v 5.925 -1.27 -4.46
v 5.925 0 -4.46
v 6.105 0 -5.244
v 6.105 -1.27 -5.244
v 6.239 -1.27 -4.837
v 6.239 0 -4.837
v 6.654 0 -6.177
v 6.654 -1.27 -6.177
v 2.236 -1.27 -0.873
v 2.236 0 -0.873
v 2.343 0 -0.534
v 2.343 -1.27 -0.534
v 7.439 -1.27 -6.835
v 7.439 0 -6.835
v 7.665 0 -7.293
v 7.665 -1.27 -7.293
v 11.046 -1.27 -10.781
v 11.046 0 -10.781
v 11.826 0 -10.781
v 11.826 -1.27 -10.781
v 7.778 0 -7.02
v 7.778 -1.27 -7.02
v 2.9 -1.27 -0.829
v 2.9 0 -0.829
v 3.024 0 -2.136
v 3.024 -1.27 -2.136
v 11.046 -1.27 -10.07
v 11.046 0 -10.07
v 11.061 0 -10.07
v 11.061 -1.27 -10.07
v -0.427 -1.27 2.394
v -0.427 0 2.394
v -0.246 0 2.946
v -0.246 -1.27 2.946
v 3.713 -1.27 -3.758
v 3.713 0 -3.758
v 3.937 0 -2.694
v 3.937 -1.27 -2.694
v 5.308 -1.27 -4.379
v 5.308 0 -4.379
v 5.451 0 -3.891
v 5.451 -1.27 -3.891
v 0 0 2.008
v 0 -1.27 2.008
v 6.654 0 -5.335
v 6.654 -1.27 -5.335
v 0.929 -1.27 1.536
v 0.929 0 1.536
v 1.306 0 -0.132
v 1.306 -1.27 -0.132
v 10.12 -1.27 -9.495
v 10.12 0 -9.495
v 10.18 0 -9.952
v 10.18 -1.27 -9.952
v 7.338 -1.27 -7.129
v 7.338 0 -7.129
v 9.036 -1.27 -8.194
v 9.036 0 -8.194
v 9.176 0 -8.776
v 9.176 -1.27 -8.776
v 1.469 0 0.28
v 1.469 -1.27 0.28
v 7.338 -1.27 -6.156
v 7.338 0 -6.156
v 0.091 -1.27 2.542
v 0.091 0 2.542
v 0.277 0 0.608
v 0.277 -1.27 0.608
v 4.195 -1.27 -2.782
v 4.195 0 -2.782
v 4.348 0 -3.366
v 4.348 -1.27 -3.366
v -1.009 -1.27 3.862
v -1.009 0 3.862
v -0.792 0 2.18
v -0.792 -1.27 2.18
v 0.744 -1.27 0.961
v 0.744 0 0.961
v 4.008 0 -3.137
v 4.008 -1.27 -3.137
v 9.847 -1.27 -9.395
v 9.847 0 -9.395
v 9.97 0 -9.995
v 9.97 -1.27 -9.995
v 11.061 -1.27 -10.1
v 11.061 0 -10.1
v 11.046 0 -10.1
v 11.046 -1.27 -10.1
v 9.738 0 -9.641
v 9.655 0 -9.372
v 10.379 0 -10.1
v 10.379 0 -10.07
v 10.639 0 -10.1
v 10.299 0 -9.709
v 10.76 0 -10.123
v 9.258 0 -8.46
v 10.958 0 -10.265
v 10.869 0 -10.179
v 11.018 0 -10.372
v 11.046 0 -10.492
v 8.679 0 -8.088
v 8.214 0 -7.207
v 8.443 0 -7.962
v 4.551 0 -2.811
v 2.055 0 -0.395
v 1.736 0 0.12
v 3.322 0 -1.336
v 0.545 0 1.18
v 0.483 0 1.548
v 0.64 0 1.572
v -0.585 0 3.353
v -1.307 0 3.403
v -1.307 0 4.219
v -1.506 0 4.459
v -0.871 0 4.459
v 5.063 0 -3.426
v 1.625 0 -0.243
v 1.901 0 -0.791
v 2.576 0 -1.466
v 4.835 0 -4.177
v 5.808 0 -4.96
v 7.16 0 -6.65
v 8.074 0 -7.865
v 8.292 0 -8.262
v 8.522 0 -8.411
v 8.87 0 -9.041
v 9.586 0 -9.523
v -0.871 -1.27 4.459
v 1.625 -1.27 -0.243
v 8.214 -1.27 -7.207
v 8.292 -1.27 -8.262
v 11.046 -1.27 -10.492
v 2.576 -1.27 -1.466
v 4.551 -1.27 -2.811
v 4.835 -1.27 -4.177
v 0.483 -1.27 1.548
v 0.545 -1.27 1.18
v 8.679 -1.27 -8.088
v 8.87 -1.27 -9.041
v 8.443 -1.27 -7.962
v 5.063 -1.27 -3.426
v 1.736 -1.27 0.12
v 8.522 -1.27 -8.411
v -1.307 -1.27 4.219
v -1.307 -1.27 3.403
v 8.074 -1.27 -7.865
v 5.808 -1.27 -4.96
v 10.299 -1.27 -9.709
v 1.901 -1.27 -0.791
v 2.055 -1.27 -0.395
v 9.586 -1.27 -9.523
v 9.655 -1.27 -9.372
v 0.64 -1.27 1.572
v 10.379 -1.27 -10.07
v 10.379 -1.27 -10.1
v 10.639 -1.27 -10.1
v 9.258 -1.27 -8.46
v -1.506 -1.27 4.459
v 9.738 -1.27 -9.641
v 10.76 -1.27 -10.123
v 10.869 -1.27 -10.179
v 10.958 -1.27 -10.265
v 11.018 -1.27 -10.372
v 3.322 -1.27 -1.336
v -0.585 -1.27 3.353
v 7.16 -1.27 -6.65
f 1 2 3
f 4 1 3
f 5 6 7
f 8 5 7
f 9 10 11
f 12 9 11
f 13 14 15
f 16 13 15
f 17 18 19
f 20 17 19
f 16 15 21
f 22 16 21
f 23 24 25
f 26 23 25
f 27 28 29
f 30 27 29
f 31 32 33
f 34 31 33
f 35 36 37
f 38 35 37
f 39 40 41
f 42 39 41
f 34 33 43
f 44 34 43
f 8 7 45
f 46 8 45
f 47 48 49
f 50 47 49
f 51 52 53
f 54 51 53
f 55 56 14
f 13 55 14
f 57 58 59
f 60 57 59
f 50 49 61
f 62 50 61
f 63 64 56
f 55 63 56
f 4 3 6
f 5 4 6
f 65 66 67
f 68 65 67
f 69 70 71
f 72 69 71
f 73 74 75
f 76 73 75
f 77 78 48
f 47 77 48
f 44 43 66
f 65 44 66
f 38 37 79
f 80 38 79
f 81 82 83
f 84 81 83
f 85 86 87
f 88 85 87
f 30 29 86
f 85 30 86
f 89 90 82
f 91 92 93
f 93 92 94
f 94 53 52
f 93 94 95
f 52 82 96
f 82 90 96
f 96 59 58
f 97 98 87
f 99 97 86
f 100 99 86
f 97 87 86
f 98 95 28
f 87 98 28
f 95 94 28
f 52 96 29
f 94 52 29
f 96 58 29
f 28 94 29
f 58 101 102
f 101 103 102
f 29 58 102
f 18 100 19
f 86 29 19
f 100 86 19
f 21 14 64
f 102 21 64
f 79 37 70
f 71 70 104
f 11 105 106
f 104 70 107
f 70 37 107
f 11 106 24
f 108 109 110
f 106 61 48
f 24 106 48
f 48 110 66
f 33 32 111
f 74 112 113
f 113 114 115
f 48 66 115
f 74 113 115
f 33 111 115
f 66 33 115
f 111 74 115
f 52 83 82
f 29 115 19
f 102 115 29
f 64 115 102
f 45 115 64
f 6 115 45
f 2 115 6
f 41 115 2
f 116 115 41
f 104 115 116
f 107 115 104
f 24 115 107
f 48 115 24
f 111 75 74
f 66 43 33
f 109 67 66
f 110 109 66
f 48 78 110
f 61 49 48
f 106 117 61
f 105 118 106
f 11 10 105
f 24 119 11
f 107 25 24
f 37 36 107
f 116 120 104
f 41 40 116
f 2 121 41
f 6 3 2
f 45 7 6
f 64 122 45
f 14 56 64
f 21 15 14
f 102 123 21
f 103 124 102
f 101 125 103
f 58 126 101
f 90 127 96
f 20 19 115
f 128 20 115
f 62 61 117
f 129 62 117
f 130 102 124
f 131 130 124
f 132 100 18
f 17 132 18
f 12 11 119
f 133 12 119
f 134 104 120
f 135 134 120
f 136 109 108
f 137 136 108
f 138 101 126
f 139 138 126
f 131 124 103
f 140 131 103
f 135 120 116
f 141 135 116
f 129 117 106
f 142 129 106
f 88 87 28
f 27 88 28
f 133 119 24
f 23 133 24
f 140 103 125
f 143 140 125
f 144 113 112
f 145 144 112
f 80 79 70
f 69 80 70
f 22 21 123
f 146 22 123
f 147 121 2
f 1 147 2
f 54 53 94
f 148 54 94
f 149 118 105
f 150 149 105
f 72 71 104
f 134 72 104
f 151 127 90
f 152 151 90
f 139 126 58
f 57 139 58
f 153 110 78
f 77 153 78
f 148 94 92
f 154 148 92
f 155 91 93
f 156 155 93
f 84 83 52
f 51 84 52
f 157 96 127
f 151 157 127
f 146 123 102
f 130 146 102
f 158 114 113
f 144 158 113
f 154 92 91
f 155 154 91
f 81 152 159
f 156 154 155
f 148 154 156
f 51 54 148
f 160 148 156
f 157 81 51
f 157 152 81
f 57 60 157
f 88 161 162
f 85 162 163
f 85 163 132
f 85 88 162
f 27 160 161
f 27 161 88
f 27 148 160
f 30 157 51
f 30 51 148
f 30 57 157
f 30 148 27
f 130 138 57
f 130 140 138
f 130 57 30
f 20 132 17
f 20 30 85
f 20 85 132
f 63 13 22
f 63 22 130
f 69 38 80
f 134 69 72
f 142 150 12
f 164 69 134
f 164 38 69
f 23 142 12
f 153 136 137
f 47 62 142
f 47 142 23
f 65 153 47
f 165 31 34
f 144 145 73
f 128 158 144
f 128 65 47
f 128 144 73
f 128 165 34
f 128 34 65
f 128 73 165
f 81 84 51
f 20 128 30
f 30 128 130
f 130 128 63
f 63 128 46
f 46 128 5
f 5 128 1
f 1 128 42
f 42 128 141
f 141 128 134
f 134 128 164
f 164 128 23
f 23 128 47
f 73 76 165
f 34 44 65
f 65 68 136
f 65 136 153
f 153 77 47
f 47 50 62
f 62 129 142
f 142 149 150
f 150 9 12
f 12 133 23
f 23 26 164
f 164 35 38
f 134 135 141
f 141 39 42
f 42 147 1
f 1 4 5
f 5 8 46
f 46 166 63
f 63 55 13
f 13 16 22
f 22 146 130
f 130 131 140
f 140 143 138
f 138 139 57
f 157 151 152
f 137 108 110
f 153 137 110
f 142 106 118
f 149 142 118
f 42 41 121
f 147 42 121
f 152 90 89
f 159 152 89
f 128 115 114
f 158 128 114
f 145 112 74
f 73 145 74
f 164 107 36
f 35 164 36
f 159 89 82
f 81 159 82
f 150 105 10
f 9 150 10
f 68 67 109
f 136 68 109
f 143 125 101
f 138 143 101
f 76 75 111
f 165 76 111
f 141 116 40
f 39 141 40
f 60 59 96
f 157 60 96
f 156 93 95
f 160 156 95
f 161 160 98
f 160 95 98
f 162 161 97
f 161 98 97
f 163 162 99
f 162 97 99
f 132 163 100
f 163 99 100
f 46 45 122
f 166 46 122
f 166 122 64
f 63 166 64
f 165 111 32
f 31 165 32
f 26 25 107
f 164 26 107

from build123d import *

# Parameters (mm, degrees)
F1_DEPTH = 1.27


with BuildPart() as f1:
    # F0 (on Front) → F1 (new body)
    with BuildSketch(Plane.XZ):
        Polygon((11.8264406887, -10.7807891433), (-0.8713469764, 4.4592108567), (-1.5063469764, 4.4592108567), (-1.3065064559, 4.2193604502), (-1.0086600117, 3.8618824447), (-0.5849018199, 3.3532840169), (-0.2455411144, 2.9459802181), (0.0911234886, 2.541912306), (0.573246897, 1.9632634155), (0.928909441, 1.5363940023), (1.6323374241, 0.6921333527), (2.2090147436, 0), (2.8997819306, -0.8290650473), (3.321811547, -1.3355888232), (4.0407046407, -2.1984108389), (4.5513520585, -2.8112945043), (5.0631082221, -3.4255088966), (5.4507959484, -3.8908152243), (5.9248896017, -4.4598267298), (6.2394758554, -4.8373960067), (6.6537557336, -5.3346184765), (7.3379562236, -6.1558021144), (7.575495537, -6.4408989541), (8.2138098271, -7.2070095585), (8.5938442703, -7.6631303464), (9.035790701, -8.1935584635), (9.2577511046, -8.4599573544), (9.7840033839, -9.0915701163), (10.1199439716, -9.4947690587), (10.2986362516, -9.7092371549), (10.5988050888, -10.0695025176), (11.0456617549, -10.0695025176), (11.0605312511, -10.0695025176), (11.0605312511, -10.099911131), (11.0605312511, -10.1845458375), (11.0605312511, -10.2025323822), (11.0605312511, -10.7807891433), (11.1914406887, -10.7807891433), (11.2468553707, -10.7807891433), align=None)
        Polygon((-1.0086600117, 3.8618824447), (-1.3065064559, 4.2193604502), (-1.3065064559, 3.4027206711), align=None)
        Polygon((-0.5849018199, 3.3532840169), (-1.0086600117, 3.8618824447), (-0.7916077157, 2.1798356902), align=None)
        with BuildLine():
            Line((11.0456617549, -10.7807891433), (11.0605312511, -10.7807891433))
            Line((11.0605312511, -10.7807891433), (11.0605312511, -10.2025323822))
            Line((11.0605312511, -10.2025323822), (11.0605312511, -10.1845458375))
            Line((11.0605312511, -10.1845458375), (11.0605312511, -10.099911131))
            Line((11.0605312511, -10.099911131), (11.0456617549, -10.099911131))
            Line((11.0456617549, -10.099911131), (11.0456617549, -10.4917703344))
            ThreePointArc((11.0456617549, -10.4917703344), (11.0469379879, -10.5246867127), (11.0456617549, -10.557603091))
            Line((11.0456617549, -10.557603091), (11.0456617549, -10.7807891433))
        make_face()
        Polygon((-0.2455411144, 2.9459802181), (-0.5849018199, 3.3532840169), (-0.4268874764, 2.3943767883), align=None)
        Polygon((0.0911234886, 2.541912306), (-0.2455411144, 2.9459802181), (0, 2.0082029514), align=None)
        with BuildLine():
            Line((11.0456617549, -10.4917703344), (11.0456617549, -10.557603091))
            ThreePointArc((11.0456617549, -10.557603091), (11.0469379879, -10.5246867127), (11.0456617549, -10.4917703344))
        make_face()
        Polygon((0.573246897, 1.9632634155), (0.0911234886, 2.541912306), (0.277421379, 0.6077454309), (0.4825687985, 1.5477624331), align=None)
        with BuildLine():
            ThreePointArc((10.6390425935, -10.099911131), (10.9168146182, -10.2185735503), (11.0456617549, -10.4917703344))
            Line((11.0456617549, -10.4917703344), (11.0456617549, -10.099911131))
            Line((11.0456617549, -10.099911131), (10.6390425935, -10.099911131))
        make_face()
        Polygon((0.928909441, 1.5363940023), (0.573246897, 1.9632634155), (0.6398208604, 1.5715317733), (0.7435218431, 0.9613389266), align=None)
        Polygon((0.6398208604, 1.5715317733), (0.573246897, 1.9632634155), (0.4825687985, 1.5477624331), (0.5450948966, 1.1798490652), align=None)
        Polygon((10.6390425935, -10.099911131), (11.0456617549, -10.099911131), (11.0456617549, -10.0695025176), (10.5988050888, -10.0695025176), (10.6241411856, -10.099911131), align=None)
        Polygon((1.6323374241, 0.6921333527), (0.928909441, 1.5363940023), (1.3060569763, -0.1315863774), (1.4691972002, 0.2802734877), align=None)
        Polygon((10.3788425163, -10.099911131), (10.6241411856, -10.099911131), (10.5988050888, -10.0695025176), (10.3788425163, -10.0695025176), align=None)
        Polygon((2.2090147436, 0), (1.6323374241, 0.6921333527), (1.7359070743, 0.1199951858), (1.900736941, -0.7905559032), (2.0548758423, -0.3952779516), align=None)
        Polygon((1.7359070743, 0.1199951858), (1.6323374241, 0.6921333527), (1.4691972002, 0.2802734877), (1.6247893218, -0.2425153507), align=None)
        Polygon((10.3788425163, -10.0695025176), (10.5988050888, -10.0695025176), (10.2986362516, -9.7092371549), align=None)
        Polygon((2.8997819306, -0.8290650473), (2.2090147436, 0), (2.3425826603, -0.5337401752), (2.5757791009, -1.4655980049), align=None)
        Polygon((2.3425826603, -0.5337401752), (2.2090147436, 0), (2.0548758423, -0.3952779516), (2.2364195902, -0.8732591523), align=None)
        Polygon((10.1796239614, -9.9518895149), (10.2986362516, -9.7092371549), (10.1199439716, -9.4947690587), align=None)
        Polygon((3.321811547, -1.3355888232), (2.8997819306, -0.8290650473), (3.0238747131, -2.1357438527), align=None)
        Polygon((9.9704461172, -9.9947974086), (10.1199439716, -9.4947690587), (9.7840033839, -9.0915701163), (9.8473794647, -9.3926533487), (9.8465451714, -9.3945556409), align=None)
        Polygon((4.0407046407, -2.1984108389), (3.321811547, -1.3355888232), (3.7131523713, -3.757573897), (3.9366614966, -2.6936607331), align=None)
        Polygon((9.8465451714, -9.3945556409), (9.7840033839, -9.0915701163), (9.6553254332, -9.3716533956), (9.7383982677, -9.6411439871), align=None)
        Polygon((9.6553254332, -9.3716533956), (9.7840033839, -9.0915701163), (9.2577511046, -8.4599573544), (9.5855835825, -9.5234550536), align=None)
        Polygon((9.8473794647, -9.3926533487), (9.7840033839, -9.0915701163), (9.8465451714, -9.3945556409), align=None)
        Polygon((4.5513520585, -2.8112945043), (4.0407046407, -2.1984108389), (4.194536978, -2.7820212599), (4.3483693153, -3.3656316809), align=None)
        Polygon((4.194536978, -2.7820212599), (4.0407046407, -2.1984108389), (3.9366614966, -2.6936607331), (4.0082986512, -3.1370188198), align=None)
        Polygon((9.1757364571, -8.7760863826), (9.2577511046, -8.4599573544), (9.035790701, -8.1935584635), align=None)
        Polygon((5.0631082221, -3.4255088966), (4.5513520585, -2.8112945043), (4.8349178396, -4.1765468195), align=None)
        Polygon((8.8703604415, -9.041281417), (9.035790701, -8.1935584635), (8.5938442703, -7.6631303464), (8.6790014305, -8.0875519305), align=None)
        Polygon((5.4507959484, -3.8908152243), (5.0631082221, -3.4255088966), (5.3079519421, -4.3792752549), align=None)
        Polygon((8.6790014305, -8.0875519305), (8.5938442703, -7.6631303464), (8.4427986396, -7.9624497125), (8.5217449814, -8.4112593904), align=None)
        Polygon((8.4427986396, -7.9624497125), (8.5938442703, -7.6631303464), (8.2138098271, -7.2070095585), (8.291753009, -8.2617690787), align=None)
        Polygon((5.9248896017, -4.4598267298), (5.4507959484, -3.8908152243), (5.8080158196, -4.9604312517), align=None)
        Polygon((8.0737182871, -7.8651150689), (8.2138098271, -7.2070095585), (7.575495537, -6.4408989541), (7.7781930442, -7.0203286494), align=None)
        Polygon((6.2394758554, -4.8373960067), (5.9248896017, -4.4598267298), (6.1053512618, -5.2442513406), align=None)
        Polygon((7.7781930442, -7.0203286494), (7.575495537, -6.4408989541), (7.4394400226, -6.8352251344), (7.6648117974, -7.2927363217), align=None)
        Polygon((7.4394400226, -6.8352251344), (7.575495537, -6.4408989541), (7.3379562236, -6.1558021144), (7.3379562236, -7.1293530054), align=None)
        Polygon((6.6537557336, -5.3346184765), (6.2394758554, -4.8373960067), (6.6537557336, -6.1768037267), align=None)
        Polygon((7.1595408954, -6.6498368979), (7.3379562236, -6.1558021144), (6.6537557336, -5.3346184765), align=None)
    extrude(amount=F1_DEPTH)


solid = f1.part
